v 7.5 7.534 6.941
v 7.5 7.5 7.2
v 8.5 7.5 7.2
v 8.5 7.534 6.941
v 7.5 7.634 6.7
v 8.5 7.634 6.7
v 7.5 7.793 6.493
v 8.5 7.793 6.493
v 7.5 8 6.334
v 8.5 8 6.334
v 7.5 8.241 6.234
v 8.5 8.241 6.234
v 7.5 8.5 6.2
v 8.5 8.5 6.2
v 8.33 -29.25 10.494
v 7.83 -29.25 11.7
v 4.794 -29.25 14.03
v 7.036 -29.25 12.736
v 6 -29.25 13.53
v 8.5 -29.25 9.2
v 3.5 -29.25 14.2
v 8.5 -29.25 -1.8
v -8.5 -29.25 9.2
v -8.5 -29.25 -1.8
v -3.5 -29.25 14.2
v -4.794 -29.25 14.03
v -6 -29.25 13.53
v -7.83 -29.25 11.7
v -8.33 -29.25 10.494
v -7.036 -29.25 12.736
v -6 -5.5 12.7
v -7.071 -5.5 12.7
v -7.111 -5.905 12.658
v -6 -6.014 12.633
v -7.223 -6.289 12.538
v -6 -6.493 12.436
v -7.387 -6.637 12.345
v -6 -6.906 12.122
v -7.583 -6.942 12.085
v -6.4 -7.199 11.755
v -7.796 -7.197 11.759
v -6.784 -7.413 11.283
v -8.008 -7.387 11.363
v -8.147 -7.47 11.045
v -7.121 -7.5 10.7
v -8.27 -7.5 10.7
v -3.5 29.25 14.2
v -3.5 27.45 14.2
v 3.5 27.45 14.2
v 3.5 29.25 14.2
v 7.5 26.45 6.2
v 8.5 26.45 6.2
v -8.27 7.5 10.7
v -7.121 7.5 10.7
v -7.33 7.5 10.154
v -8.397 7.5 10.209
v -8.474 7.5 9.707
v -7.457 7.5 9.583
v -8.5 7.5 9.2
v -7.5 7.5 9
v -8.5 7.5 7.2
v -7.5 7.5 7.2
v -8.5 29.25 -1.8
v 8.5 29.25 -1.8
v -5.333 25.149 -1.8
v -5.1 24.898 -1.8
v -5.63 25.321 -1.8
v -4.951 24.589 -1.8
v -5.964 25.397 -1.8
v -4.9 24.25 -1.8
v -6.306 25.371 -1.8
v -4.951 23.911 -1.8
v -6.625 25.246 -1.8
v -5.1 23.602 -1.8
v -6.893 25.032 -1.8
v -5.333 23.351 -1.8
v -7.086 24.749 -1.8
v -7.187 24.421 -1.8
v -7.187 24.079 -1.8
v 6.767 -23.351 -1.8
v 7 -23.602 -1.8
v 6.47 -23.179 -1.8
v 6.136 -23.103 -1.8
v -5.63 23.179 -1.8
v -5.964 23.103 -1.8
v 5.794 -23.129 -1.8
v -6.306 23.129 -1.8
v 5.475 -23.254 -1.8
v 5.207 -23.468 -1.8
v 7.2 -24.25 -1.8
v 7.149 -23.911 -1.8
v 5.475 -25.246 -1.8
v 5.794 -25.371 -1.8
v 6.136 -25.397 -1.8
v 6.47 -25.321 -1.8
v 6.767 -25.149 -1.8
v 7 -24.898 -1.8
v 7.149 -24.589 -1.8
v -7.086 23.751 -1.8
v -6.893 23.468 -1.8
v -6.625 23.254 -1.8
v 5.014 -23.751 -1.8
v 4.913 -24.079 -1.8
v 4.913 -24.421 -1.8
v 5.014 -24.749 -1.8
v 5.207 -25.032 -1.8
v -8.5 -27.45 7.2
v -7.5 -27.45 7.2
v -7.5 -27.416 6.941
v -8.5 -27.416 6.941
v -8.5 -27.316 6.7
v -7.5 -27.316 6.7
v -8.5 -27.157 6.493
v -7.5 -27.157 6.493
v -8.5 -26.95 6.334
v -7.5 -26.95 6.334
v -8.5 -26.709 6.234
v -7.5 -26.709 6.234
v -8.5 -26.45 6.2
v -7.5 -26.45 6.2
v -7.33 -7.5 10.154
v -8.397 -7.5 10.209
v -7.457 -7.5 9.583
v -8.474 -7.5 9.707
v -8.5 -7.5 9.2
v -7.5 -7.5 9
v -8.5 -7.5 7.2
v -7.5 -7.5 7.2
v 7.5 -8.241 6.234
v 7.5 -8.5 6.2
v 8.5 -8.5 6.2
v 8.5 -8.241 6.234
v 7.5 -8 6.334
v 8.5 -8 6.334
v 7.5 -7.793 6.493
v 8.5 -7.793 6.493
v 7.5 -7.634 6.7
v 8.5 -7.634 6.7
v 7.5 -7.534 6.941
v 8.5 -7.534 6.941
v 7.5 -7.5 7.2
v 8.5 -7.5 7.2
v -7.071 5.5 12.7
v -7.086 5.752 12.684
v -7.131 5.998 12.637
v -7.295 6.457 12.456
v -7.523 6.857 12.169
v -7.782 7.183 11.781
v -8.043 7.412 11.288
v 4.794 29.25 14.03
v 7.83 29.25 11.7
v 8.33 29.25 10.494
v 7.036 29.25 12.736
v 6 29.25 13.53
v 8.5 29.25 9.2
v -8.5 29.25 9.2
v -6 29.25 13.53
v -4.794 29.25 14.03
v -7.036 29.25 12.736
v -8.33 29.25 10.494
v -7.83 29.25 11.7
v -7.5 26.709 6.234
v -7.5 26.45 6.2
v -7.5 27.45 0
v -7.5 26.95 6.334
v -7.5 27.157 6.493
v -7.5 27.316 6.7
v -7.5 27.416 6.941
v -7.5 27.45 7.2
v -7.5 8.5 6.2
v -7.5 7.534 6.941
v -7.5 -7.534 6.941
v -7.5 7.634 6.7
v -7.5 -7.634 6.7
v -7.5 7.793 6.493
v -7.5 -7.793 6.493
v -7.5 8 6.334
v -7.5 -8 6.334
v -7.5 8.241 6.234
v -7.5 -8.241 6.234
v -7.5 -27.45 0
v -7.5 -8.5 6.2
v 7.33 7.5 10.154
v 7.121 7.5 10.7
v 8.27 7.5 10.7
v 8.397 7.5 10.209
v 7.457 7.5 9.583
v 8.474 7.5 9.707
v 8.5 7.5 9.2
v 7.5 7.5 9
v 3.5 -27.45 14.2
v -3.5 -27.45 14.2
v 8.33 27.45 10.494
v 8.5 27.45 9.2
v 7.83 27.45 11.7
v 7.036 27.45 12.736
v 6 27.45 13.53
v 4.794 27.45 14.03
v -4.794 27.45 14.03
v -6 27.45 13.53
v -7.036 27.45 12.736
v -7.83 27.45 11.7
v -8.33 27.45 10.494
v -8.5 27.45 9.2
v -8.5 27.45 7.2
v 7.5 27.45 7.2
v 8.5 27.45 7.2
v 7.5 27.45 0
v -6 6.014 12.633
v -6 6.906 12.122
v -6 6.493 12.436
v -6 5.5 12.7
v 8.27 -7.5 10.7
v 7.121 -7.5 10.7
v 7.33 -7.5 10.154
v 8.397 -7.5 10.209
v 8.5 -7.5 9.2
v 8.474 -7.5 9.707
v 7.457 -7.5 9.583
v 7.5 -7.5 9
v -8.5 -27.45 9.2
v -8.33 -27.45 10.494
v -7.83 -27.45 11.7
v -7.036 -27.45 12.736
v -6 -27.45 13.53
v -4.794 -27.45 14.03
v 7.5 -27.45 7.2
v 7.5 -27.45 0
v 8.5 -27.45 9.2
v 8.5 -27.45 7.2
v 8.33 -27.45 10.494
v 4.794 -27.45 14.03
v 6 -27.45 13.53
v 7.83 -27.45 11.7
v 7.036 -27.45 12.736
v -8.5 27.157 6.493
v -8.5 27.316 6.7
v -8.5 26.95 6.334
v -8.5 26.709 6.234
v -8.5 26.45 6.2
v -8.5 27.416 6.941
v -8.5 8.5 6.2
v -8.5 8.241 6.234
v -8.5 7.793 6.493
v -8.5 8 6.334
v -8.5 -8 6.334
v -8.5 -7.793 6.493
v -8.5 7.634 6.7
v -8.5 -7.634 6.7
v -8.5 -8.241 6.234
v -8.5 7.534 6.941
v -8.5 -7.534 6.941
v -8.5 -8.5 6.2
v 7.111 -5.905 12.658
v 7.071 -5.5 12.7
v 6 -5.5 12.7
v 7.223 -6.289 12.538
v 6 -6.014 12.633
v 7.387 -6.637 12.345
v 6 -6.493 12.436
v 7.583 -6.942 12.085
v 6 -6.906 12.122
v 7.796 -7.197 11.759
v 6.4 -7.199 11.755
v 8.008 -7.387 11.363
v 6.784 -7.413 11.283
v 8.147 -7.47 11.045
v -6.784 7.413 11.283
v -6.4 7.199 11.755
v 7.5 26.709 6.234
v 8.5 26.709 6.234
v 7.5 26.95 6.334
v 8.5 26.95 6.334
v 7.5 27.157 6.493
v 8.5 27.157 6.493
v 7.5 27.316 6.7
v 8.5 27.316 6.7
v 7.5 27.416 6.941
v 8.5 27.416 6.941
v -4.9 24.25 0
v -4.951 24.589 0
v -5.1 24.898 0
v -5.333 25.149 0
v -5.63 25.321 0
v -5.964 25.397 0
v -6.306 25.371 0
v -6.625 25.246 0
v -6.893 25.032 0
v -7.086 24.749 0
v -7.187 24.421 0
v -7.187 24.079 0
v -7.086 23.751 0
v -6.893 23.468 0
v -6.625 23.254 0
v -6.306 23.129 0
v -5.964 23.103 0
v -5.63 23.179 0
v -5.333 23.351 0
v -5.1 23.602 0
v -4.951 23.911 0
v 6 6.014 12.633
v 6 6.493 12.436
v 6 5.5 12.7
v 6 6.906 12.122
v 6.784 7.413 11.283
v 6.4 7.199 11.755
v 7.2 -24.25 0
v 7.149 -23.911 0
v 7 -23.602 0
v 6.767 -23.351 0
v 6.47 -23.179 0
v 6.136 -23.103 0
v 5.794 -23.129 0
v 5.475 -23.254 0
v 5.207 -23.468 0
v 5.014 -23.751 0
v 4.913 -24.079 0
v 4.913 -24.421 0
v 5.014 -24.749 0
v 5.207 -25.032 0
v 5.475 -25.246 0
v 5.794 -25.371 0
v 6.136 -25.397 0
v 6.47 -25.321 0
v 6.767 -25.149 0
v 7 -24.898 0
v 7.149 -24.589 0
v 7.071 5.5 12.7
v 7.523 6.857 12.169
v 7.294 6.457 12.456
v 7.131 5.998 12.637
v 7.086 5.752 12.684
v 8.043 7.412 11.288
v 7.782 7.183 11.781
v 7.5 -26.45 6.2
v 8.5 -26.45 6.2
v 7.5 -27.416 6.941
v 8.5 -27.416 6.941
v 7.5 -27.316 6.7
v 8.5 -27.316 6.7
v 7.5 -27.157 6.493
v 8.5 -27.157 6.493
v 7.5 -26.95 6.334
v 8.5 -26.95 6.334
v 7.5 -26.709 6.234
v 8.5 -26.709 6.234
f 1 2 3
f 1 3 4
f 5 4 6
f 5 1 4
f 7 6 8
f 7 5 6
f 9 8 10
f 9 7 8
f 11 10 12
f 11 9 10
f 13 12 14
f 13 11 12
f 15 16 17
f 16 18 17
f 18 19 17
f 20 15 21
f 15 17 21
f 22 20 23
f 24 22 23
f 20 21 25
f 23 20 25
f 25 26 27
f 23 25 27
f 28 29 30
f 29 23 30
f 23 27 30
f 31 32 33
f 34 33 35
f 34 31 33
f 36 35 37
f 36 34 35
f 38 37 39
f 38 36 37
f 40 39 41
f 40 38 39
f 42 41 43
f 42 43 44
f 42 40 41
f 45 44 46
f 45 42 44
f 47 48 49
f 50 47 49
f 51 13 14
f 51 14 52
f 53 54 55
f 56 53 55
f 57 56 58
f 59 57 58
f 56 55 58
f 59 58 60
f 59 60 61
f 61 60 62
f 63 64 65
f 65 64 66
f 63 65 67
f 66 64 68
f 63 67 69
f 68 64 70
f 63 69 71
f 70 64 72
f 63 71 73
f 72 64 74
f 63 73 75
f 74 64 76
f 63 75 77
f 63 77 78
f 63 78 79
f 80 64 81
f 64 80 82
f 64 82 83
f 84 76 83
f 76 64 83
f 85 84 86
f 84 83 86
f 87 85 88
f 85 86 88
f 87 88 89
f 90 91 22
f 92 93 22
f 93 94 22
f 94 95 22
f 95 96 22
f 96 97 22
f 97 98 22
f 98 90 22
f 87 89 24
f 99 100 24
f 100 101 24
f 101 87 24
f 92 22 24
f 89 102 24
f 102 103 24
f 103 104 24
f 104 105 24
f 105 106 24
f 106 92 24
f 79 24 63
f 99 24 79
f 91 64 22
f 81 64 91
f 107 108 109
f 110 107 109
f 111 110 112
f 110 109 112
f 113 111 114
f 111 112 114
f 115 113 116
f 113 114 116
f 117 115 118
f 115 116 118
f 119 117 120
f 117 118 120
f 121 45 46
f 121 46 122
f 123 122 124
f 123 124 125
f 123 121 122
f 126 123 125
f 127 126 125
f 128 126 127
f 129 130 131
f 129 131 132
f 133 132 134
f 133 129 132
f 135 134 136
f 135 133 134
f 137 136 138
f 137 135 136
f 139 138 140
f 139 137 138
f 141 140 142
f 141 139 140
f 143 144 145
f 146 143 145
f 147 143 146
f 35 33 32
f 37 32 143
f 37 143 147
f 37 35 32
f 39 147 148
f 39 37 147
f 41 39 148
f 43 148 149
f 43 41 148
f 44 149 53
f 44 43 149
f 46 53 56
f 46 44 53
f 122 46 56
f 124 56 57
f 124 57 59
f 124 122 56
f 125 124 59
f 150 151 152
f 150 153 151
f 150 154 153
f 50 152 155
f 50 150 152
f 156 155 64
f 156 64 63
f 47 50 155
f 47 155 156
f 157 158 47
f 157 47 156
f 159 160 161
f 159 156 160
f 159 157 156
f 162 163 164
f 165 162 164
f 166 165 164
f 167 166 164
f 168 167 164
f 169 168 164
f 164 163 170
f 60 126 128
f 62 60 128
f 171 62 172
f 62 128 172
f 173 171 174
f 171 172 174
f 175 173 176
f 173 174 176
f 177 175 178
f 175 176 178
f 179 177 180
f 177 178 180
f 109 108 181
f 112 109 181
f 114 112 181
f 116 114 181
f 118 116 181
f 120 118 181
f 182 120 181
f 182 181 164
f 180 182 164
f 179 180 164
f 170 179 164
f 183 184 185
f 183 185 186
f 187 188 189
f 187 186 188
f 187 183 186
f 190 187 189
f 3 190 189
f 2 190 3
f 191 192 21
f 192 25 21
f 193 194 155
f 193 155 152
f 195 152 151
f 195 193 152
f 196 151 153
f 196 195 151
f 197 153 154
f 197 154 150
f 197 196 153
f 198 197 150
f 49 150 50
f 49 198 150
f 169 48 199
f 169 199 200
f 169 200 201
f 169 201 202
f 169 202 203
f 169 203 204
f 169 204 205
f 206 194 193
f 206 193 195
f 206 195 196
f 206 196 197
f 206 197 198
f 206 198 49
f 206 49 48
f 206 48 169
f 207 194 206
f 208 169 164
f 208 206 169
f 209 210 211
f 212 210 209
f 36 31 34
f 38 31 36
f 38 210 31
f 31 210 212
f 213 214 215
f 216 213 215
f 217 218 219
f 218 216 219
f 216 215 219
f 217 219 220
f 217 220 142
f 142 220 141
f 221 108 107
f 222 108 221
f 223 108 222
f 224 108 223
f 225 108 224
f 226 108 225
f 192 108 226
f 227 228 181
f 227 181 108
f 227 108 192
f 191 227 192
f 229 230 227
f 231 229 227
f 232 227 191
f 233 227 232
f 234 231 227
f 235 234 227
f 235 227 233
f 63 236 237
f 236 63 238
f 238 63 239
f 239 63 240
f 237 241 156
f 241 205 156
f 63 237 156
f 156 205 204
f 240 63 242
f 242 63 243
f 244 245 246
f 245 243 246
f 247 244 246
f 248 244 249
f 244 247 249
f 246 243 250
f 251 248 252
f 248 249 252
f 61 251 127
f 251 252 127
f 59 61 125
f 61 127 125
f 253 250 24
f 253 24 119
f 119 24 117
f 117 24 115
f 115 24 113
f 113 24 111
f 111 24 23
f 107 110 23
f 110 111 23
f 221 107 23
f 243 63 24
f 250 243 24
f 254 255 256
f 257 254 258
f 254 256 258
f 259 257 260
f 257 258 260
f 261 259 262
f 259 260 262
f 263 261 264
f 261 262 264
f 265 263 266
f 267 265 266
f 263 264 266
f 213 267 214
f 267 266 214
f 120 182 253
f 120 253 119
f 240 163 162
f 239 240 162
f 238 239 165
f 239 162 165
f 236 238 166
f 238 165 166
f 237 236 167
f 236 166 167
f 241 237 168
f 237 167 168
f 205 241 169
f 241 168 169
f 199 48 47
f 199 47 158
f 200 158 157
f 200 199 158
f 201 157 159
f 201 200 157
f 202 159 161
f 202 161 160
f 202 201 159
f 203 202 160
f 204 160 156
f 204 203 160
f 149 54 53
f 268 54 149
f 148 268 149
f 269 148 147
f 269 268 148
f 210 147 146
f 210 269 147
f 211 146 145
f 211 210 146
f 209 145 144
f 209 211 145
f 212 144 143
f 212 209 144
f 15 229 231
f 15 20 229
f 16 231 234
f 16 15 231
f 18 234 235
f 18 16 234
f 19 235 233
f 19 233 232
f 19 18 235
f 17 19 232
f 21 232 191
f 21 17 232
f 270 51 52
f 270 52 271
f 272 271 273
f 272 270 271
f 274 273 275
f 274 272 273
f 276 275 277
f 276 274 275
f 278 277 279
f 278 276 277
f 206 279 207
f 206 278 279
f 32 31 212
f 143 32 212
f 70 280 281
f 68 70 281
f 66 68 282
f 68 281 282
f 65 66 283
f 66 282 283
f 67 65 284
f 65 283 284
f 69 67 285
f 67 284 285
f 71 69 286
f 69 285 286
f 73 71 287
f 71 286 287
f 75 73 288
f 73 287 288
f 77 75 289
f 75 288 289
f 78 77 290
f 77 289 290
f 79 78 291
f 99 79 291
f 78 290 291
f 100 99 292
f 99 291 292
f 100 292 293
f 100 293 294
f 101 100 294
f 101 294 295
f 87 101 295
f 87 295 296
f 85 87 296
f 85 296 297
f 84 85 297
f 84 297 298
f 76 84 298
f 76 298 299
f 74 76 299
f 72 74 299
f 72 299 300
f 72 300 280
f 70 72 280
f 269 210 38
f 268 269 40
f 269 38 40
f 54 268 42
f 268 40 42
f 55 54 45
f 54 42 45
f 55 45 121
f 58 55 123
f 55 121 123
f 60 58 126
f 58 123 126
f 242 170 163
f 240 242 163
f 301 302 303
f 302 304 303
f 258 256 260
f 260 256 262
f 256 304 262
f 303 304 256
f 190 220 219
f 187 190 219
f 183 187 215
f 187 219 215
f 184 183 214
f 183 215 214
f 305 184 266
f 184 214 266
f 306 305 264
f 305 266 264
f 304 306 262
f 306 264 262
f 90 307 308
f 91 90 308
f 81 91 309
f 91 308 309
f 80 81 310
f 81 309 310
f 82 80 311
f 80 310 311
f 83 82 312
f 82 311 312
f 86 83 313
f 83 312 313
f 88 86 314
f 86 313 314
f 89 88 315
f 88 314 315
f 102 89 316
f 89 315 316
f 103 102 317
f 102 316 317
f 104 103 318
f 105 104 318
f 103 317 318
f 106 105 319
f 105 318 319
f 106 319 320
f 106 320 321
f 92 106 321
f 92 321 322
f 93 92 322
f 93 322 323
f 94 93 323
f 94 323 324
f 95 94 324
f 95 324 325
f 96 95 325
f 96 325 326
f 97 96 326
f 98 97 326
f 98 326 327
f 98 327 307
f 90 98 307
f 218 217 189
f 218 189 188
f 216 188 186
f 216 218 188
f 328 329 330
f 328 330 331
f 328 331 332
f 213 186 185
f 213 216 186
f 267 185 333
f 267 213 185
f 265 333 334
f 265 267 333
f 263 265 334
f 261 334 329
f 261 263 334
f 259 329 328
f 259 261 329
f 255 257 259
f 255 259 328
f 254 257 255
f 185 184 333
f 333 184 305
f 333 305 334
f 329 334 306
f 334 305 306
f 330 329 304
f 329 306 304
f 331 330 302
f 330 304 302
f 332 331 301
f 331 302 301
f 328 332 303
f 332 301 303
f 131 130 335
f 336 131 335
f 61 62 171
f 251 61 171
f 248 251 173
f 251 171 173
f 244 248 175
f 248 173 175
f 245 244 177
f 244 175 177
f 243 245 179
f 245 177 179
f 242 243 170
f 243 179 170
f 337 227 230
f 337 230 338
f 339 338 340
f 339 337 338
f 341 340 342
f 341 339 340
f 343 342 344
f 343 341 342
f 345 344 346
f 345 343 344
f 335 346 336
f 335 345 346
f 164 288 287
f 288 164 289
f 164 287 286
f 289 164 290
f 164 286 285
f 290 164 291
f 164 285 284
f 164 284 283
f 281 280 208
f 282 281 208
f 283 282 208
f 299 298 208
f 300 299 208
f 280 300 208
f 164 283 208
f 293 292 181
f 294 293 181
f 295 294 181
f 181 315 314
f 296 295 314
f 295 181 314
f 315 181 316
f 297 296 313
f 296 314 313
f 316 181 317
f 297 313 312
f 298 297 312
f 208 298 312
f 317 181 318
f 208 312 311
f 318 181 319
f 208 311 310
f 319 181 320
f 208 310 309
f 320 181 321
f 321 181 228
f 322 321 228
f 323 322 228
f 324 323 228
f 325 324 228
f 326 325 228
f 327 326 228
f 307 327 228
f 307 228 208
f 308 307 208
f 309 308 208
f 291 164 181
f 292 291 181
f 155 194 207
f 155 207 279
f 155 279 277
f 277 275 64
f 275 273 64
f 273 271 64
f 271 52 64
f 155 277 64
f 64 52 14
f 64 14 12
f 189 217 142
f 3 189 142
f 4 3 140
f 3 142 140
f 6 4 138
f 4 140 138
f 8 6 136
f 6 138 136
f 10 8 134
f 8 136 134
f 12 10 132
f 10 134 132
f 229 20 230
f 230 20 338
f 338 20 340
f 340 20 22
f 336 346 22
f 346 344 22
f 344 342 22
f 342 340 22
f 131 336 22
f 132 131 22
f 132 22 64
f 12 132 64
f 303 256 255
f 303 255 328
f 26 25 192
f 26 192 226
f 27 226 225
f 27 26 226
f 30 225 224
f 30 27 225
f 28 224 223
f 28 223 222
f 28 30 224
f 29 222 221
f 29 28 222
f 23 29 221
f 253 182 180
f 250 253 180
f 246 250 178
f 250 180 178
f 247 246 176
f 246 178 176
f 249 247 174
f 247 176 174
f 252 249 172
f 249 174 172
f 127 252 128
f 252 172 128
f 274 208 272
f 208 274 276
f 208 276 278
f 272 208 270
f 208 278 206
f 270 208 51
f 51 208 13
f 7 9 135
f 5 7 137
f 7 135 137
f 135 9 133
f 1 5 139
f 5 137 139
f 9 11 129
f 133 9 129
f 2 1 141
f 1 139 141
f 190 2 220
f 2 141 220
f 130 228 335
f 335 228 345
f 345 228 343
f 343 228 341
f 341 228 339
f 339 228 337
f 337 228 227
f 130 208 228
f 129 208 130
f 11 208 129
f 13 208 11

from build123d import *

# Parameters (mm, degrees)
PAD_DEPTH            = 29.25
POCKET_DEPTH         = 27.45
POCKET002_DEPTH      = 8.501
POCKET002_DEPTH_BACK = 8.501
SKETCH017_W          = 12
SKETCH017_H          = 20
POCKET003_DEPTH      = 7.5
SKETCH018_R          = 1.15
POCKET004_DEPTH      = 1.801
POCKET004_DEPTH_BACK = 14.201


with BuildPart() as part:
    # Sketch → Pad (new body, symmetric)
    with BuildSketch(Plane.XZ):
        with BuildLine():
            Line((-3.5, 14.2), (3.5, 14.2))
            ThreePointArc((8.5, 9.2), (7.035534, 12.735534), (3.5, 14.2))
            Line((8.5, 9.2), (8.5, -1.8))
            Line((8.5, -1.8), (-8.5, -1.8))
            Line((-8.5, -1.8), (-8.5, 9.2))
            ThreePointArc((-3.5, 14.2), (-7.035534, 12.735534), (-8.5, 9.2))
        make_face()
    extrude(amount=PAD_DEPTH, both=True)

    # Sketch014 → Pocket (cut, symmetric)
    with BuildSketch(Plane.XZ):
        with BuildLine():
            Line((-7.5, 0), (7.5, 0))
            Line((7.5, 0), (7.5, 9))
            ThreePointArc((7.5, 9), (6.328427, 11.828427), (3.5, 13))
            Line((3.5, 13), (-3.5, 13))
            ThreePointArc((-3.5, 13), (-6.328427, 11.828427), (-7.5, 9))
            Line((-7.5, 9), (-7.5, 0))
        make_face()
    extrude(amount=POCKET_DEPTH, both=True, mode=Mode.SUBTRACT)

    # Sketch016 → Pocket002 (cut, two sides)
    with BuildSketch(Plane.YZ) as pocket002_sk:
        with BuildLine():
            Line((-5.5, 12.7), (5.5, 12.7))
            ThreePointArc((7.5, 10.7), (6.914214, 12.114214), (5.5, 12.7))
            Line((7.5, 10.7), (7.5, 7.2))
            ThreePointArc((7.5, 7.2), (7.792893, 6.492893), (8.5, 6.2))
            Line((8.5, 6.2), (26.45, 6.2))
            ThreePointArc((26.45, 6.2), (27.157107, 6.492893), (27.45, 7.2))
            Line((27.45, 22.7), (27.45, 7.2))
            Line((-27.45, 22.7), (27.45, 22.7))
            Line((-27.45, 7.2), (-27.45, 22.7))
            ThreePointArc((-27.45, 7.2), (-27.157107, 6.492893), (-26.45, 6.2))
            Line((-8.5, 6.2), (-26.45, 6.2))
            ThreePointArc((-8.5, 6.2), (-7.792893, 6.492893), (-7.5, 7.2))
            Line((-7.5, 10.7), (-7.5, 7.2))
            ThreePointArc((-5.5, 12.7), (-6.914214, 12.114214), (-7.5, 10.7))
        make_face()
    extrude(amount=-POCKET002_DEPTH, mode=Mode.SUBTRACT)
    extrude(pocket002_sk.sketch, amount=POCKET002_DEPTH_BACK, mode=Mode.SUBTRACT)

    # Sketch017 → Pocket003 (cut, symmetric)
    with BuildSketch(Plane.XZ):
        with Locations((0, 11)):
            Rectangle(SKETCH017_W, SKETCH017_H)
    extrude(amount=POCKET003_DEPTH, both=True, mode=Mode.SUBTRACT)

    # Sketch018 → Pocket004 (cut, two sides)
    with BuildSketch(Plane.XY) as pocket004_sk:
        with Locations((-6.05, 24.25)):
            Circle(SKETCH018_R)
        with Locations((6.05, -24.25)):
            Circle(SKETCH018_R)
    extrude(amount=-POCKET004_DEPTH, mode=Mode.SUBTRACT)
    extrude(pocket004_sk.sketch, amount=POCKET004_DEPTH_BACK, mode=Mode.SUBTRACT)


solid = part.part
